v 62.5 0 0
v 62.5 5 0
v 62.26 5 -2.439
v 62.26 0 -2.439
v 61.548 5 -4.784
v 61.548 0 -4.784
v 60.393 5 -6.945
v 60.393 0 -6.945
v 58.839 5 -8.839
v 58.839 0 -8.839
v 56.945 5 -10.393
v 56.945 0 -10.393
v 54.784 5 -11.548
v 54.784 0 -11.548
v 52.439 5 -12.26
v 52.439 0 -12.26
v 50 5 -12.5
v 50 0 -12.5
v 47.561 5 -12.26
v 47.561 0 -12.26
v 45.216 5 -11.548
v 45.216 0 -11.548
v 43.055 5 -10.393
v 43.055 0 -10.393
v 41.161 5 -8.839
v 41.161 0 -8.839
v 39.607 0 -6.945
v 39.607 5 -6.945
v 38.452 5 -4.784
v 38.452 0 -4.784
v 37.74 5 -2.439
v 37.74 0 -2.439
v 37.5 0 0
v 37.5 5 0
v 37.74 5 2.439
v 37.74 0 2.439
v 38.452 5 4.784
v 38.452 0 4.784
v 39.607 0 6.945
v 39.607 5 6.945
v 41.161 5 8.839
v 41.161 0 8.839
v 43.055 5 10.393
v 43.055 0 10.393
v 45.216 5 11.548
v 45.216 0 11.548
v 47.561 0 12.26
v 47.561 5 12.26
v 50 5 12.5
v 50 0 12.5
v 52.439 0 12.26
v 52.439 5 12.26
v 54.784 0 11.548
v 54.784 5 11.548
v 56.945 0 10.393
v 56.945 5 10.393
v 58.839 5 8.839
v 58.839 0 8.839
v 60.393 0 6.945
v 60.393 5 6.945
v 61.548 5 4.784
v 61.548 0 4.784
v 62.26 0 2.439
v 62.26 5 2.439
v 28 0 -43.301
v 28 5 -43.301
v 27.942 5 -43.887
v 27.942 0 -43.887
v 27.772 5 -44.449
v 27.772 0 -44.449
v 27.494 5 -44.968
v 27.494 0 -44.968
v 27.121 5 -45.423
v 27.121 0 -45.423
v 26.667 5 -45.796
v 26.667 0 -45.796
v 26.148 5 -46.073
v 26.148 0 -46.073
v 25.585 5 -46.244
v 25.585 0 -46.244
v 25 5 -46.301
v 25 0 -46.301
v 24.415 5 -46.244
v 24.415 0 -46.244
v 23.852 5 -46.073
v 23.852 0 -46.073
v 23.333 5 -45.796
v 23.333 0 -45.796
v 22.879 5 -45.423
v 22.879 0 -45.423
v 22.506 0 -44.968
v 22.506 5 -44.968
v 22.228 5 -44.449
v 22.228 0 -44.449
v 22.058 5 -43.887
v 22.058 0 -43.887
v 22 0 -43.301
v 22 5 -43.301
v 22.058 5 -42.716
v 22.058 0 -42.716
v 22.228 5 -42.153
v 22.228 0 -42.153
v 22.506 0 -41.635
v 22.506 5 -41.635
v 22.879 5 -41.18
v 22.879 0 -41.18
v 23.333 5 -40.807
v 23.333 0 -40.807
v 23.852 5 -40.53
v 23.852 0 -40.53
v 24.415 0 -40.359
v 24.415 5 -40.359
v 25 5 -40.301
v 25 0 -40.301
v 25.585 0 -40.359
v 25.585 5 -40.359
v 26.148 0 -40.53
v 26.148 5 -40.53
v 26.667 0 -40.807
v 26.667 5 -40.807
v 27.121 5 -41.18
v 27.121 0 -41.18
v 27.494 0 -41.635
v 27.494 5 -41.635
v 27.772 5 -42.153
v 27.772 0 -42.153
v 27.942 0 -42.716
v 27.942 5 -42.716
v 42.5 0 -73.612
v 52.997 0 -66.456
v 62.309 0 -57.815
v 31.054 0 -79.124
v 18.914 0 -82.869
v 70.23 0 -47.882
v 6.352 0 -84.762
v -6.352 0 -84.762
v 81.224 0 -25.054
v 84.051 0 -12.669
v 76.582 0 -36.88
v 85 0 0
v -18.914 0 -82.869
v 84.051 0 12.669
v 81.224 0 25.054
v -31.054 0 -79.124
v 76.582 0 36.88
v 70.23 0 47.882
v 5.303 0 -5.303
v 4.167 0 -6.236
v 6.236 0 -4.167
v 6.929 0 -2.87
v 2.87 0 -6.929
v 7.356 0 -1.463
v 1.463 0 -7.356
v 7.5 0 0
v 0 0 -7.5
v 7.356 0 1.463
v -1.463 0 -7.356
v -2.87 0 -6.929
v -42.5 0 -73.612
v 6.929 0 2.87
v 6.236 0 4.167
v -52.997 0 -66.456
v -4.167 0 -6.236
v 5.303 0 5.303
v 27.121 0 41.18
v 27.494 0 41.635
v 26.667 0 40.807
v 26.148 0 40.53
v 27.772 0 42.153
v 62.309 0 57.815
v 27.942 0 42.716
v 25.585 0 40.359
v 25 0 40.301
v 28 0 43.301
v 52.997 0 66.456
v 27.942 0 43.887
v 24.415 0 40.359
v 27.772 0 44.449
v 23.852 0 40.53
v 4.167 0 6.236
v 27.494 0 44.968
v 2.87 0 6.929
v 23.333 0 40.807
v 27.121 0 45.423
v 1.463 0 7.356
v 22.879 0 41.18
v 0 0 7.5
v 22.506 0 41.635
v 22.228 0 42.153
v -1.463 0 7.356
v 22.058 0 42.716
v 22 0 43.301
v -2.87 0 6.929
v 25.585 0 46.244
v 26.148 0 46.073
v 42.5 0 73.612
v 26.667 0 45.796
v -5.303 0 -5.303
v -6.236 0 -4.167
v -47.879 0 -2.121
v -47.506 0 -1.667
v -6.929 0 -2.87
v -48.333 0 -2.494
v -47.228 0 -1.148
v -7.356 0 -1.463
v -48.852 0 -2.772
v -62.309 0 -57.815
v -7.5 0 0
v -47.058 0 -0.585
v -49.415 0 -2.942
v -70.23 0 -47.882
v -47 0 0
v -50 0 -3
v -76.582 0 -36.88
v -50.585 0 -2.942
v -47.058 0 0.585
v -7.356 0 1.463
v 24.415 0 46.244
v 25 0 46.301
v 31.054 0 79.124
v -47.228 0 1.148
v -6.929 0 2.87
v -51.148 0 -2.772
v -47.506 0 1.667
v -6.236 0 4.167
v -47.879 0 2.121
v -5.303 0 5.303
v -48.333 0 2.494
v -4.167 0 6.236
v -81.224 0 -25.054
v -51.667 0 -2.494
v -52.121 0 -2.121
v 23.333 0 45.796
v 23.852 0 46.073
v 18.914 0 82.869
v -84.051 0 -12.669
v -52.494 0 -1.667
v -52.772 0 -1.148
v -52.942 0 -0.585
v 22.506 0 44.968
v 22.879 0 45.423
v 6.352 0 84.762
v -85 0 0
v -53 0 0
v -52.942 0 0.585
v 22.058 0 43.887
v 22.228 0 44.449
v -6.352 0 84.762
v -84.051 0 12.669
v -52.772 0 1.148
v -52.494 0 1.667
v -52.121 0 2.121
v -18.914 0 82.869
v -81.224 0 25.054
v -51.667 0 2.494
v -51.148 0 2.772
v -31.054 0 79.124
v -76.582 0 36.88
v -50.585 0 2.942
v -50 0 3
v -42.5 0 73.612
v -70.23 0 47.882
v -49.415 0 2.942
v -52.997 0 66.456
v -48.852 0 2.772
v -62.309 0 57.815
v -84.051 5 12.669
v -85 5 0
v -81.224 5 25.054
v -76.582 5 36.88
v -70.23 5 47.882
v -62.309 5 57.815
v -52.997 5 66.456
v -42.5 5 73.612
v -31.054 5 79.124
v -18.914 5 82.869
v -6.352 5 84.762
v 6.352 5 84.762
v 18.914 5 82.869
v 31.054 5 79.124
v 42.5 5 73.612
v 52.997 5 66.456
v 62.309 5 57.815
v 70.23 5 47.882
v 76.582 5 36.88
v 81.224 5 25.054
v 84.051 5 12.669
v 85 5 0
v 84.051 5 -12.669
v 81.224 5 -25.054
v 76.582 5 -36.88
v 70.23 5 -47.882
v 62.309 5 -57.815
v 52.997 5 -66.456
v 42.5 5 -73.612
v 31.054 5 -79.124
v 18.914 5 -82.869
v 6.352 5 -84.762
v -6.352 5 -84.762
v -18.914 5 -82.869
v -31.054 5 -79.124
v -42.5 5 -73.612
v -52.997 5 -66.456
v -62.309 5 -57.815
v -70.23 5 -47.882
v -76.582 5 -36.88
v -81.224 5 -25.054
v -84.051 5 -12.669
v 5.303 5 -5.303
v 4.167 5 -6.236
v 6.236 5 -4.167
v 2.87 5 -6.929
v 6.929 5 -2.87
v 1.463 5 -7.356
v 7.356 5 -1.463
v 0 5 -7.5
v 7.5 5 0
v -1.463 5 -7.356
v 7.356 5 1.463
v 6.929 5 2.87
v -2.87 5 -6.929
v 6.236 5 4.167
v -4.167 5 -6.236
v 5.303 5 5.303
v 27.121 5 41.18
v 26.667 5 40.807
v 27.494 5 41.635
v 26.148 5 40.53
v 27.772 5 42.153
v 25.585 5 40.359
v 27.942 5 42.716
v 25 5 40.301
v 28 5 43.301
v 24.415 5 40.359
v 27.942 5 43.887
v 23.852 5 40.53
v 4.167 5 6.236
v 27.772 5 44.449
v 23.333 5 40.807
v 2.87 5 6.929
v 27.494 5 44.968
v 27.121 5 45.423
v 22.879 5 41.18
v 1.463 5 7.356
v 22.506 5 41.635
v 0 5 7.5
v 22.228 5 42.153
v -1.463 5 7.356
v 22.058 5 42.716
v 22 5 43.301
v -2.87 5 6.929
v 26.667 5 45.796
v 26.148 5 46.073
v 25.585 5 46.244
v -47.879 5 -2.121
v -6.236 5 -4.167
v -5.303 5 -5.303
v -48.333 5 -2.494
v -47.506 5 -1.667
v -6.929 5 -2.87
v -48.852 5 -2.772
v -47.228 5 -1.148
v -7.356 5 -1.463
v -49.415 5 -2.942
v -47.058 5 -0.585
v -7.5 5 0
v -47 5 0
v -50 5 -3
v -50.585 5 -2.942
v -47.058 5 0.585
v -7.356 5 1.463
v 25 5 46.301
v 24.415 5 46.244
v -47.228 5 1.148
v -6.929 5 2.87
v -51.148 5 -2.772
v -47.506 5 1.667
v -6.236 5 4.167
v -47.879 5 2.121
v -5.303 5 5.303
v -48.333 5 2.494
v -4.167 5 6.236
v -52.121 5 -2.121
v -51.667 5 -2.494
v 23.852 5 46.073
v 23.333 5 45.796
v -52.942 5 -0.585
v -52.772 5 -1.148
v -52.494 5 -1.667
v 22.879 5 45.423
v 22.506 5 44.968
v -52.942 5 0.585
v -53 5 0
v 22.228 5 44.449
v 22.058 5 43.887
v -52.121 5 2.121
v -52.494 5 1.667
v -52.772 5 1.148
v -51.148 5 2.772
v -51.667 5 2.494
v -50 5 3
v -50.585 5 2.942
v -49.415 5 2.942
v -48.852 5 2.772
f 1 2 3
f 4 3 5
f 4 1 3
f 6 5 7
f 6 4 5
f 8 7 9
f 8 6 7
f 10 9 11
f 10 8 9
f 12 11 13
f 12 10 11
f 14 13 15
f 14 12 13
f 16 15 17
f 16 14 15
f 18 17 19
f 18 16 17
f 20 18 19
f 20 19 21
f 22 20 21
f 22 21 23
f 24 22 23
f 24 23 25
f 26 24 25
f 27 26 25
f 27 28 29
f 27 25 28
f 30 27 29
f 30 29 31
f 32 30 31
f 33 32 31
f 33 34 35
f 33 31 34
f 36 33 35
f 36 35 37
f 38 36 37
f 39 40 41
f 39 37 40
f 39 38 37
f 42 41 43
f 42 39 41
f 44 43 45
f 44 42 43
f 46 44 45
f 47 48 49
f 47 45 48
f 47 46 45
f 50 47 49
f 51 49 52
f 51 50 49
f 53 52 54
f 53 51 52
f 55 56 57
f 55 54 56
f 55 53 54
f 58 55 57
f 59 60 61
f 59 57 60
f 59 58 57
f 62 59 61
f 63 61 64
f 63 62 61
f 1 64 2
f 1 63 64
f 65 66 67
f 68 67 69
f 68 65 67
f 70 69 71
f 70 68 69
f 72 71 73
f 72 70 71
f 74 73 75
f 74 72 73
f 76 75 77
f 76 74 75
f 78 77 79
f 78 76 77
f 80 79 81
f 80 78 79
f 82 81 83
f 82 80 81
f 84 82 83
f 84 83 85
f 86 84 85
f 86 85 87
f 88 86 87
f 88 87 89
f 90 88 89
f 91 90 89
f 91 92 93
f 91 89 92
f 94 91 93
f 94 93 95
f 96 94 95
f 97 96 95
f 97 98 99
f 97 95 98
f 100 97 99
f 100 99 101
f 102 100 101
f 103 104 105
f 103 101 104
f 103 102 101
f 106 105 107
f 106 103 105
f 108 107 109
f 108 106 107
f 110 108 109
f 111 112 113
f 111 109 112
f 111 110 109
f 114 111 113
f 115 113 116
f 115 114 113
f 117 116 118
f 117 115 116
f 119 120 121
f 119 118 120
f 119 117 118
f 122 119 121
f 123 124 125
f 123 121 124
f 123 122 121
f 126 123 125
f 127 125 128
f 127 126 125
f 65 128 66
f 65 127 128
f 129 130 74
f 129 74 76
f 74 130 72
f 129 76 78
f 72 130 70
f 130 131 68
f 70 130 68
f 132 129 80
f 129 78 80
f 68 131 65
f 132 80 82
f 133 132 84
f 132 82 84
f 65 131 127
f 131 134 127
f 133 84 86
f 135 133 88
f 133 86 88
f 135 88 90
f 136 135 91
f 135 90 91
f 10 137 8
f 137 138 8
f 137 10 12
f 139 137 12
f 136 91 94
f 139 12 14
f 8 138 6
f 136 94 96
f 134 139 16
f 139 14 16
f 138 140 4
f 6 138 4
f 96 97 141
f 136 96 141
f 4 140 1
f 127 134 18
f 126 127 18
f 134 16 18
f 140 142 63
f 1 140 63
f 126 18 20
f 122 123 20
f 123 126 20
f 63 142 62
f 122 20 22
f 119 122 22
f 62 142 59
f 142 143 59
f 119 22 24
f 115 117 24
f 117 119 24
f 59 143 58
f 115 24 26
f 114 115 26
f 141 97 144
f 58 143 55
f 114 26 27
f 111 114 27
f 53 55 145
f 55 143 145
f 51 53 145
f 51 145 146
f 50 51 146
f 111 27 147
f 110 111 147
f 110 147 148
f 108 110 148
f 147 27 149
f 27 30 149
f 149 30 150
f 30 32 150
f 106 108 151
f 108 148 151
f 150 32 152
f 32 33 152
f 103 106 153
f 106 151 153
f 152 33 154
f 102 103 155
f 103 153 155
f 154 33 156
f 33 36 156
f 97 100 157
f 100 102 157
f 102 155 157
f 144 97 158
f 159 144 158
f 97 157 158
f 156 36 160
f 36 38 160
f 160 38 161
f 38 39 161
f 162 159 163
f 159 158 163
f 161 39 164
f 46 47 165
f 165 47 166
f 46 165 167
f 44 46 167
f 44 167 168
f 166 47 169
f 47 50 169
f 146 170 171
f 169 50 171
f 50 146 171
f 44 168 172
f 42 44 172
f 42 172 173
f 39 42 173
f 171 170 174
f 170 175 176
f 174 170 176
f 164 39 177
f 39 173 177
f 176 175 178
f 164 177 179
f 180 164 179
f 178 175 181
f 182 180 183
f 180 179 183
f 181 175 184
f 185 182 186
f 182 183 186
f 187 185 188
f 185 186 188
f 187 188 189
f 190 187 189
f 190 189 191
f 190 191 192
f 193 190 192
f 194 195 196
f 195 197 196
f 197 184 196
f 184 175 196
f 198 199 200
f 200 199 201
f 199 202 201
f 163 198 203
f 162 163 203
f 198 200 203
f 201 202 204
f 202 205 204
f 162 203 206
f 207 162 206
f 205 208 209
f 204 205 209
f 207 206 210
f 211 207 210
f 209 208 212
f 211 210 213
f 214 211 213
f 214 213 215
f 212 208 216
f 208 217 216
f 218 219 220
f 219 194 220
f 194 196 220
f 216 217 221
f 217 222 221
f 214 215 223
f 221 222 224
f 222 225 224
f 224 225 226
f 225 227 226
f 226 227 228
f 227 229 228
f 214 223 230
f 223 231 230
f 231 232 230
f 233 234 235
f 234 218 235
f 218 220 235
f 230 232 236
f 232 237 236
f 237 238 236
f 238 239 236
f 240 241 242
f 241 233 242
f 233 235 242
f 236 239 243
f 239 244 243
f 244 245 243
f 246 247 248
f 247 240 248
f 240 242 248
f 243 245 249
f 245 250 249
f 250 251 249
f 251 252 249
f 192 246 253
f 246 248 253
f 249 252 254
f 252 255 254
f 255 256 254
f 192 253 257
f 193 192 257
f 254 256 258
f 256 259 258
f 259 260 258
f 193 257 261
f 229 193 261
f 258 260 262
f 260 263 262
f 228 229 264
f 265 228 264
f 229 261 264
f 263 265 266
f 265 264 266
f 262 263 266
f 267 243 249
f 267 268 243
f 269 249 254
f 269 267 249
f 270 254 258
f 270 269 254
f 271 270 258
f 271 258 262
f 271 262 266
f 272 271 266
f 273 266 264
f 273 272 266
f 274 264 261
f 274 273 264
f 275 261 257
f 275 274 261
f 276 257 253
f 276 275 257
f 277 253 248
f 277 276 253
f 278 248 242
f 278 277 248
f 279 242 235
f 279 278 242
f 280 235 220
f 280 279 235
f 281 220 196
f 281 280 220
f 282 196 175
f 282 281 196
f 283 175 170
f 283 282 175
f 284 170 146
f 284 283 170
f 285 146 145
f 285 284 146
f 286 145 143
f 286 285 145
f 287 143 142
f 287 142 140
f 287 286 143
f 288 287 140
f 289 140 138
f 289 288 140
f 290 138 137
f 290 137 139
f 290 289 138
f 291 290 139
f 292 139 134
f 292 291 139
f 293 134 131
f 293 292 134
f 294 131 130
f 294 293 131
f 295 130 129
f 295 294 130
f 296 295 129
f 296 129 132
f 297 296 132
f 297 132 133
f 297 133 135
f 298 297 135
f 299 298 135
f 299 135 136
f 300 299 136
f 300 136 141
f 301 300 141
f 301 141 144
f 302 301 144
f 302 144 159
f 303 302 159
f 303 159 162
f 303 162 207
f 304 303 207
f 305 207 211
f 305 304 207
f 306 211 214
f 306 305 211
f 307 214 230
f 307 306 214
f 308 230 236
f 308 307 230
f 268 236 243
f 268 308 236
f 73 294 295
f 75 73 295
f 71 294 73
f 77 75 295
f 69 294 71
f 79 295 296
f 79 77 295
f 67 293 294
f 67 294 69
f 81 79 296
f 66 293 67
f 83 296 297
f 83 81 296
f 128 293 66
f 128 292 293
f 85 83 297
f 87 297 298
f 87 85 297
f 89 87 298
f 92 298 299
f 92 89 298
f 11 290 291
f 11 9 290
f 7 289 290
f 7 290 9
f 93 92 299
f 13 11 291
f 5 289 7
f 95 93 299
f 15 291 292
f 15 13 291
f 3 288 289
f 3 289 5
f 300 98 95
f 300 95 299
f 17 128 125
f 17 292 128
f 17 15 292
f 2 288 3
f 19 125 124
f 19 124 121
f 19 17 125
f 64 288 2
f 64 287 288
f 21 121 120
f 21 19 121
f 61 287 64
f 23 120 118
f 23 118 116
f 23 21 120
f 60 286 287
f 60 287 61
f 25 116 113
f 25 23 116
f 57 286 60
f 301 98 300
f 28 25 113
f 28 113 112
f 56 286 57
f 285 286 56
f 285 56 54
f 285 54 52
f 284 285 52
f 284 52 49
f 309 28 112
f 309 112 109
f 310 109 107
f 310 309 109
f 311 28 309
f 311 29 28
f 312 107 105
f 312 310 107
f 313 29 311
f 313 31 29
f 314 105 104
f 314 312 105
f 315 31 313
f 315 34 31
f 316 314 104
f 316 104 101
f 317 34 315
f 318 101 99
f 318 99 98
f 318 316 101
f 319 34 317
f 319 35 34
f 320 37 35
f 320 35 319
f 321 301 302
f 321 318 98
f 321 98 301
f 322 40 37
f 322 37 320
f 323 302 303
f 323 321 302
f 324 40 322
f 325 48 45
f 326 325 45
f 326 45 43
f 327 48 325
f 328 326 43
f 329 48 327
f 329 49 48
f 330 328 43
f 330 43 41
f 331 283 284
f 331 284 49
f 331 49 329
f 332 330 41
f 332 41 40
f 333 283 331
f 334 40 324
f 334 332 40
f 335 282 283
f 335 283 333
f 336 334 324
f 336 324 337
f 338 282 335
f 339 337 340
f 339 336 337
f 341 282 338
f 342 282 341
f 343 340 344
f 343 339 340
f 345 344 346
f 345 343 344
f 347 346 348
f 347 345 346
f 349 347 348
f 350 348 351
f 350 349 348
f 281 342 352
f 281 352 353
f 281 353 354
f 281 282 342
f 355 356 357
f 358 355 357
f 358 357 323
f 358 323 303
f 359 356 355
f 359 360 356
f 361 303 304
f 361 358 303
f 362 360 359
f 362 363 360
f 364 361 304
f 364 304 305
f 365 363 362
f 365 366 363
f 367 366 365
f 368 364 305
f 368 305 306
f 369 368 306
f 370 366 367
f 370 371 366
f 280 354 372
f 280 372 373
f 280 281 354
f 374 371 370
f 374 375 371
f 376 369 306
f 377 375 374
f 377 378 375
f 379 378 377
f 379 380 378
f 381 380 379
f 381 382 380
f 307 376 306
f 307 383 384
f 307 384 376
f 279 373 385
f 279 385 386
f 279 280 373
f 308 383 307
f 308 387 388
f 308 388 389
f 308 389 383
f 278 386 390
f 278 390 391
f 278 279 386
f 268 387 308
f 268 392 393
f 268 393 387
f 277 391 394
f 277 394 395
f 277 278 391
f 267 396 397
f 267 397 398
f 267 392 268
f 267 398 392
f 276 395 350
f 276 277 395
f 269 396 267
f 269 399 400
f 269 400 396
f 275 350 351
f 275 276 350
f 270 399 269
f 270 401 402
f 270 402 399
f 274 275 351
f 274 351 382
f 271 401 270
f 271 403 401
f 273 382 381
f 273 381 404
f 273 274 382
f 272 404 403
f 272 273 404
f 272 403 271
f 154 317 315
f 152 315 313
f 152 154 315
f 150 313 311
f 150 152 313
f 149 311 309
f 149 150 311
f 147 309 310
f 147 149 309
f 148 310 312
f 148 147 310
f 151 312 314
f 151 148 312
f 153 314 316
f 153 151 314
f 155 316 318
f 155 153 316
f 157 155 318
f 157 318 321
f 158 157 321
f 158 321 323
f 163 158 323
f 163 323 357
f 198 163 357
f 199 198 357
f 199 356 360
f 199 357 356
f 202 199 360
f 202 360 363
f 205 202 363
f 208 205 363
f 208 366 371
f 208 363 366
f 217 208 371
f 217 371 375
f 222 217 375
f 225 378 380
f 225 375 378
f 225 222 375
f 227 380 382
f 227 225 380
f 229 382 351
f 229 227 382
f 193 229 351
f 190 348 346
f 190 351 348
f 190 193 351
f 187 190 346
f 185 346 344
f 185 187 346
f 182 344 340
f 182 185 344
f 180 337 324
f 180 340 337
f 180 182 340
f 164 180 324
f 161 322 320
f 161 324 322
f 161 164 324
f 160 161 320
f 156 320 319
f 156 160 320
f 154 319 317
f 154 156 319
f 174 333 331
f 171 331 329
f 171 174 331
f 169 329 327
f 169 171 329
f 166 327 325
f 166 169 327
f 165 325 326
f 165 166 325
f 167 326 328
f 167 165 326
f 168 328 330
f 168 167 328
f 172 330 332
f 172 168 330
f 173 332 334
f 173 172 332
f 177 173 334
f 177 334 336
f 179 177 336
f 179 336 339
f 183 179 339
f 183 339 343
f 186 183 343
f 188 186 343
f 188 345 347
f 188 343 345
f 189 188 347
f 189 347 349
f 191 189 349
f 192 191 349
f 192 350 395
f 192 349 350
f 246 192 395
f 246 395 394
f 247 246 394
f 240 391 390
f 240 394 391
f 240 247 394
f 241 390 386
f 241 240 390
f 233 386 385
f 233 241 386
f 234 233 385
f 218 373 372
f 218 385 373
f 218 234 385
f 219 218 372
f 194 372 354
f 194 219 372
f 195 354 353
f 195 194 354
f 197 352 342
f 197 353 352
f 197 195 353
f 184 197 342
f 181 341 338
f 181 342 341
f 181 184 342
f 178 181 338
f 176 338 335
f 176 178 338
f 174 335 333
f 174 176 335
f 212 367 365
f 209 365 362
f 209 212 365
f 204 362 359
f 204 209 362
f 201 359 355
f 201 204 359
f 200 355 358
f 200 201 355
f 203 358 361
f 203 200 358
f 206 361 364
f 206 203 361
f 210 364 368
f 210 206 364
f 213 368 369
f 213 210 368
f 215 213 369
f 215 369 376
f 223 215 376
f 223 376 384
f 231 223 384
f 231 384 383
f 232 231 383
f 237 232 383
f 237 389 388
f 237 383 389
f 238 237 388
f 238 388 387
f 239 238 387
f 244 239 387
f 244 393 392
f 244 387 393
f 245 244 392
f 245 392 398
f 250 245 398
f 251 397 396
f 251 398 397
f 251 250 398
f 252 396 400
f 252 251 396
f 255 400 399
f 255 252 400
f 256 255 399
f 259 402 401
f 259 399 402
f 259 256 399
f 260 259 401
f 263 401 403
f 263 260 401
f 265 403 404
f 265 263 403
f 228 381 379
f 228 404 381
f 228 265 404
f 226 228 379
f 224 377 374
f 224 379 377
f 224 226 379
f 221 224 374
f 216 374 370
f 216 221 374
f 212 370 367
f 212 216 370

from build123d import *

# Parameters (mm, degrees)
SKETCH_1_W          = 85
SKETCH_1_H          = 5
SKETCH_2_R          = 12.5
SKETCH_2_R_2        = 7.5
SKETCH_2_R_3        = 3
CUT_EXTRUDE_1_DEPTH = 20


with BuildPart() as part:
    # 草图1 → 旋转1 (revolve)
    with BuildSketch(Plane.XY):
        with Locations((-42.5, 2.5)):
            Rectangle(SKETCH_1_W, SKETCH_1_H)
    revolve(axis=Axis((0, 0, 0), (0, 1, 0)))

    # 草图2 → 切除-拉伸1 (cut)
    with BuildSketch(Plane(origin=(0, 0, 0), x_dir=(1, 0, 0), z_dir=(0, 1, 0))):
        with Locations((50, 0)):
            Circle(SKETCH_2_R)
        Circle(SKETCH_2_R_2)
        with Locations((-50, 0)):
            Circle(SKETCH_2_R_3)
        with Locations((25, 43.301270189)):
            Circle(SKETCH_2_R_3)
        with Locations((25, -43.301270189)):
            Circle(SKETCH_2_R_3)
    extrude(amount=CUT_EXTRUDE_1_DEPTH, mode=Mode.SUBTRACT)


solid = part.part
